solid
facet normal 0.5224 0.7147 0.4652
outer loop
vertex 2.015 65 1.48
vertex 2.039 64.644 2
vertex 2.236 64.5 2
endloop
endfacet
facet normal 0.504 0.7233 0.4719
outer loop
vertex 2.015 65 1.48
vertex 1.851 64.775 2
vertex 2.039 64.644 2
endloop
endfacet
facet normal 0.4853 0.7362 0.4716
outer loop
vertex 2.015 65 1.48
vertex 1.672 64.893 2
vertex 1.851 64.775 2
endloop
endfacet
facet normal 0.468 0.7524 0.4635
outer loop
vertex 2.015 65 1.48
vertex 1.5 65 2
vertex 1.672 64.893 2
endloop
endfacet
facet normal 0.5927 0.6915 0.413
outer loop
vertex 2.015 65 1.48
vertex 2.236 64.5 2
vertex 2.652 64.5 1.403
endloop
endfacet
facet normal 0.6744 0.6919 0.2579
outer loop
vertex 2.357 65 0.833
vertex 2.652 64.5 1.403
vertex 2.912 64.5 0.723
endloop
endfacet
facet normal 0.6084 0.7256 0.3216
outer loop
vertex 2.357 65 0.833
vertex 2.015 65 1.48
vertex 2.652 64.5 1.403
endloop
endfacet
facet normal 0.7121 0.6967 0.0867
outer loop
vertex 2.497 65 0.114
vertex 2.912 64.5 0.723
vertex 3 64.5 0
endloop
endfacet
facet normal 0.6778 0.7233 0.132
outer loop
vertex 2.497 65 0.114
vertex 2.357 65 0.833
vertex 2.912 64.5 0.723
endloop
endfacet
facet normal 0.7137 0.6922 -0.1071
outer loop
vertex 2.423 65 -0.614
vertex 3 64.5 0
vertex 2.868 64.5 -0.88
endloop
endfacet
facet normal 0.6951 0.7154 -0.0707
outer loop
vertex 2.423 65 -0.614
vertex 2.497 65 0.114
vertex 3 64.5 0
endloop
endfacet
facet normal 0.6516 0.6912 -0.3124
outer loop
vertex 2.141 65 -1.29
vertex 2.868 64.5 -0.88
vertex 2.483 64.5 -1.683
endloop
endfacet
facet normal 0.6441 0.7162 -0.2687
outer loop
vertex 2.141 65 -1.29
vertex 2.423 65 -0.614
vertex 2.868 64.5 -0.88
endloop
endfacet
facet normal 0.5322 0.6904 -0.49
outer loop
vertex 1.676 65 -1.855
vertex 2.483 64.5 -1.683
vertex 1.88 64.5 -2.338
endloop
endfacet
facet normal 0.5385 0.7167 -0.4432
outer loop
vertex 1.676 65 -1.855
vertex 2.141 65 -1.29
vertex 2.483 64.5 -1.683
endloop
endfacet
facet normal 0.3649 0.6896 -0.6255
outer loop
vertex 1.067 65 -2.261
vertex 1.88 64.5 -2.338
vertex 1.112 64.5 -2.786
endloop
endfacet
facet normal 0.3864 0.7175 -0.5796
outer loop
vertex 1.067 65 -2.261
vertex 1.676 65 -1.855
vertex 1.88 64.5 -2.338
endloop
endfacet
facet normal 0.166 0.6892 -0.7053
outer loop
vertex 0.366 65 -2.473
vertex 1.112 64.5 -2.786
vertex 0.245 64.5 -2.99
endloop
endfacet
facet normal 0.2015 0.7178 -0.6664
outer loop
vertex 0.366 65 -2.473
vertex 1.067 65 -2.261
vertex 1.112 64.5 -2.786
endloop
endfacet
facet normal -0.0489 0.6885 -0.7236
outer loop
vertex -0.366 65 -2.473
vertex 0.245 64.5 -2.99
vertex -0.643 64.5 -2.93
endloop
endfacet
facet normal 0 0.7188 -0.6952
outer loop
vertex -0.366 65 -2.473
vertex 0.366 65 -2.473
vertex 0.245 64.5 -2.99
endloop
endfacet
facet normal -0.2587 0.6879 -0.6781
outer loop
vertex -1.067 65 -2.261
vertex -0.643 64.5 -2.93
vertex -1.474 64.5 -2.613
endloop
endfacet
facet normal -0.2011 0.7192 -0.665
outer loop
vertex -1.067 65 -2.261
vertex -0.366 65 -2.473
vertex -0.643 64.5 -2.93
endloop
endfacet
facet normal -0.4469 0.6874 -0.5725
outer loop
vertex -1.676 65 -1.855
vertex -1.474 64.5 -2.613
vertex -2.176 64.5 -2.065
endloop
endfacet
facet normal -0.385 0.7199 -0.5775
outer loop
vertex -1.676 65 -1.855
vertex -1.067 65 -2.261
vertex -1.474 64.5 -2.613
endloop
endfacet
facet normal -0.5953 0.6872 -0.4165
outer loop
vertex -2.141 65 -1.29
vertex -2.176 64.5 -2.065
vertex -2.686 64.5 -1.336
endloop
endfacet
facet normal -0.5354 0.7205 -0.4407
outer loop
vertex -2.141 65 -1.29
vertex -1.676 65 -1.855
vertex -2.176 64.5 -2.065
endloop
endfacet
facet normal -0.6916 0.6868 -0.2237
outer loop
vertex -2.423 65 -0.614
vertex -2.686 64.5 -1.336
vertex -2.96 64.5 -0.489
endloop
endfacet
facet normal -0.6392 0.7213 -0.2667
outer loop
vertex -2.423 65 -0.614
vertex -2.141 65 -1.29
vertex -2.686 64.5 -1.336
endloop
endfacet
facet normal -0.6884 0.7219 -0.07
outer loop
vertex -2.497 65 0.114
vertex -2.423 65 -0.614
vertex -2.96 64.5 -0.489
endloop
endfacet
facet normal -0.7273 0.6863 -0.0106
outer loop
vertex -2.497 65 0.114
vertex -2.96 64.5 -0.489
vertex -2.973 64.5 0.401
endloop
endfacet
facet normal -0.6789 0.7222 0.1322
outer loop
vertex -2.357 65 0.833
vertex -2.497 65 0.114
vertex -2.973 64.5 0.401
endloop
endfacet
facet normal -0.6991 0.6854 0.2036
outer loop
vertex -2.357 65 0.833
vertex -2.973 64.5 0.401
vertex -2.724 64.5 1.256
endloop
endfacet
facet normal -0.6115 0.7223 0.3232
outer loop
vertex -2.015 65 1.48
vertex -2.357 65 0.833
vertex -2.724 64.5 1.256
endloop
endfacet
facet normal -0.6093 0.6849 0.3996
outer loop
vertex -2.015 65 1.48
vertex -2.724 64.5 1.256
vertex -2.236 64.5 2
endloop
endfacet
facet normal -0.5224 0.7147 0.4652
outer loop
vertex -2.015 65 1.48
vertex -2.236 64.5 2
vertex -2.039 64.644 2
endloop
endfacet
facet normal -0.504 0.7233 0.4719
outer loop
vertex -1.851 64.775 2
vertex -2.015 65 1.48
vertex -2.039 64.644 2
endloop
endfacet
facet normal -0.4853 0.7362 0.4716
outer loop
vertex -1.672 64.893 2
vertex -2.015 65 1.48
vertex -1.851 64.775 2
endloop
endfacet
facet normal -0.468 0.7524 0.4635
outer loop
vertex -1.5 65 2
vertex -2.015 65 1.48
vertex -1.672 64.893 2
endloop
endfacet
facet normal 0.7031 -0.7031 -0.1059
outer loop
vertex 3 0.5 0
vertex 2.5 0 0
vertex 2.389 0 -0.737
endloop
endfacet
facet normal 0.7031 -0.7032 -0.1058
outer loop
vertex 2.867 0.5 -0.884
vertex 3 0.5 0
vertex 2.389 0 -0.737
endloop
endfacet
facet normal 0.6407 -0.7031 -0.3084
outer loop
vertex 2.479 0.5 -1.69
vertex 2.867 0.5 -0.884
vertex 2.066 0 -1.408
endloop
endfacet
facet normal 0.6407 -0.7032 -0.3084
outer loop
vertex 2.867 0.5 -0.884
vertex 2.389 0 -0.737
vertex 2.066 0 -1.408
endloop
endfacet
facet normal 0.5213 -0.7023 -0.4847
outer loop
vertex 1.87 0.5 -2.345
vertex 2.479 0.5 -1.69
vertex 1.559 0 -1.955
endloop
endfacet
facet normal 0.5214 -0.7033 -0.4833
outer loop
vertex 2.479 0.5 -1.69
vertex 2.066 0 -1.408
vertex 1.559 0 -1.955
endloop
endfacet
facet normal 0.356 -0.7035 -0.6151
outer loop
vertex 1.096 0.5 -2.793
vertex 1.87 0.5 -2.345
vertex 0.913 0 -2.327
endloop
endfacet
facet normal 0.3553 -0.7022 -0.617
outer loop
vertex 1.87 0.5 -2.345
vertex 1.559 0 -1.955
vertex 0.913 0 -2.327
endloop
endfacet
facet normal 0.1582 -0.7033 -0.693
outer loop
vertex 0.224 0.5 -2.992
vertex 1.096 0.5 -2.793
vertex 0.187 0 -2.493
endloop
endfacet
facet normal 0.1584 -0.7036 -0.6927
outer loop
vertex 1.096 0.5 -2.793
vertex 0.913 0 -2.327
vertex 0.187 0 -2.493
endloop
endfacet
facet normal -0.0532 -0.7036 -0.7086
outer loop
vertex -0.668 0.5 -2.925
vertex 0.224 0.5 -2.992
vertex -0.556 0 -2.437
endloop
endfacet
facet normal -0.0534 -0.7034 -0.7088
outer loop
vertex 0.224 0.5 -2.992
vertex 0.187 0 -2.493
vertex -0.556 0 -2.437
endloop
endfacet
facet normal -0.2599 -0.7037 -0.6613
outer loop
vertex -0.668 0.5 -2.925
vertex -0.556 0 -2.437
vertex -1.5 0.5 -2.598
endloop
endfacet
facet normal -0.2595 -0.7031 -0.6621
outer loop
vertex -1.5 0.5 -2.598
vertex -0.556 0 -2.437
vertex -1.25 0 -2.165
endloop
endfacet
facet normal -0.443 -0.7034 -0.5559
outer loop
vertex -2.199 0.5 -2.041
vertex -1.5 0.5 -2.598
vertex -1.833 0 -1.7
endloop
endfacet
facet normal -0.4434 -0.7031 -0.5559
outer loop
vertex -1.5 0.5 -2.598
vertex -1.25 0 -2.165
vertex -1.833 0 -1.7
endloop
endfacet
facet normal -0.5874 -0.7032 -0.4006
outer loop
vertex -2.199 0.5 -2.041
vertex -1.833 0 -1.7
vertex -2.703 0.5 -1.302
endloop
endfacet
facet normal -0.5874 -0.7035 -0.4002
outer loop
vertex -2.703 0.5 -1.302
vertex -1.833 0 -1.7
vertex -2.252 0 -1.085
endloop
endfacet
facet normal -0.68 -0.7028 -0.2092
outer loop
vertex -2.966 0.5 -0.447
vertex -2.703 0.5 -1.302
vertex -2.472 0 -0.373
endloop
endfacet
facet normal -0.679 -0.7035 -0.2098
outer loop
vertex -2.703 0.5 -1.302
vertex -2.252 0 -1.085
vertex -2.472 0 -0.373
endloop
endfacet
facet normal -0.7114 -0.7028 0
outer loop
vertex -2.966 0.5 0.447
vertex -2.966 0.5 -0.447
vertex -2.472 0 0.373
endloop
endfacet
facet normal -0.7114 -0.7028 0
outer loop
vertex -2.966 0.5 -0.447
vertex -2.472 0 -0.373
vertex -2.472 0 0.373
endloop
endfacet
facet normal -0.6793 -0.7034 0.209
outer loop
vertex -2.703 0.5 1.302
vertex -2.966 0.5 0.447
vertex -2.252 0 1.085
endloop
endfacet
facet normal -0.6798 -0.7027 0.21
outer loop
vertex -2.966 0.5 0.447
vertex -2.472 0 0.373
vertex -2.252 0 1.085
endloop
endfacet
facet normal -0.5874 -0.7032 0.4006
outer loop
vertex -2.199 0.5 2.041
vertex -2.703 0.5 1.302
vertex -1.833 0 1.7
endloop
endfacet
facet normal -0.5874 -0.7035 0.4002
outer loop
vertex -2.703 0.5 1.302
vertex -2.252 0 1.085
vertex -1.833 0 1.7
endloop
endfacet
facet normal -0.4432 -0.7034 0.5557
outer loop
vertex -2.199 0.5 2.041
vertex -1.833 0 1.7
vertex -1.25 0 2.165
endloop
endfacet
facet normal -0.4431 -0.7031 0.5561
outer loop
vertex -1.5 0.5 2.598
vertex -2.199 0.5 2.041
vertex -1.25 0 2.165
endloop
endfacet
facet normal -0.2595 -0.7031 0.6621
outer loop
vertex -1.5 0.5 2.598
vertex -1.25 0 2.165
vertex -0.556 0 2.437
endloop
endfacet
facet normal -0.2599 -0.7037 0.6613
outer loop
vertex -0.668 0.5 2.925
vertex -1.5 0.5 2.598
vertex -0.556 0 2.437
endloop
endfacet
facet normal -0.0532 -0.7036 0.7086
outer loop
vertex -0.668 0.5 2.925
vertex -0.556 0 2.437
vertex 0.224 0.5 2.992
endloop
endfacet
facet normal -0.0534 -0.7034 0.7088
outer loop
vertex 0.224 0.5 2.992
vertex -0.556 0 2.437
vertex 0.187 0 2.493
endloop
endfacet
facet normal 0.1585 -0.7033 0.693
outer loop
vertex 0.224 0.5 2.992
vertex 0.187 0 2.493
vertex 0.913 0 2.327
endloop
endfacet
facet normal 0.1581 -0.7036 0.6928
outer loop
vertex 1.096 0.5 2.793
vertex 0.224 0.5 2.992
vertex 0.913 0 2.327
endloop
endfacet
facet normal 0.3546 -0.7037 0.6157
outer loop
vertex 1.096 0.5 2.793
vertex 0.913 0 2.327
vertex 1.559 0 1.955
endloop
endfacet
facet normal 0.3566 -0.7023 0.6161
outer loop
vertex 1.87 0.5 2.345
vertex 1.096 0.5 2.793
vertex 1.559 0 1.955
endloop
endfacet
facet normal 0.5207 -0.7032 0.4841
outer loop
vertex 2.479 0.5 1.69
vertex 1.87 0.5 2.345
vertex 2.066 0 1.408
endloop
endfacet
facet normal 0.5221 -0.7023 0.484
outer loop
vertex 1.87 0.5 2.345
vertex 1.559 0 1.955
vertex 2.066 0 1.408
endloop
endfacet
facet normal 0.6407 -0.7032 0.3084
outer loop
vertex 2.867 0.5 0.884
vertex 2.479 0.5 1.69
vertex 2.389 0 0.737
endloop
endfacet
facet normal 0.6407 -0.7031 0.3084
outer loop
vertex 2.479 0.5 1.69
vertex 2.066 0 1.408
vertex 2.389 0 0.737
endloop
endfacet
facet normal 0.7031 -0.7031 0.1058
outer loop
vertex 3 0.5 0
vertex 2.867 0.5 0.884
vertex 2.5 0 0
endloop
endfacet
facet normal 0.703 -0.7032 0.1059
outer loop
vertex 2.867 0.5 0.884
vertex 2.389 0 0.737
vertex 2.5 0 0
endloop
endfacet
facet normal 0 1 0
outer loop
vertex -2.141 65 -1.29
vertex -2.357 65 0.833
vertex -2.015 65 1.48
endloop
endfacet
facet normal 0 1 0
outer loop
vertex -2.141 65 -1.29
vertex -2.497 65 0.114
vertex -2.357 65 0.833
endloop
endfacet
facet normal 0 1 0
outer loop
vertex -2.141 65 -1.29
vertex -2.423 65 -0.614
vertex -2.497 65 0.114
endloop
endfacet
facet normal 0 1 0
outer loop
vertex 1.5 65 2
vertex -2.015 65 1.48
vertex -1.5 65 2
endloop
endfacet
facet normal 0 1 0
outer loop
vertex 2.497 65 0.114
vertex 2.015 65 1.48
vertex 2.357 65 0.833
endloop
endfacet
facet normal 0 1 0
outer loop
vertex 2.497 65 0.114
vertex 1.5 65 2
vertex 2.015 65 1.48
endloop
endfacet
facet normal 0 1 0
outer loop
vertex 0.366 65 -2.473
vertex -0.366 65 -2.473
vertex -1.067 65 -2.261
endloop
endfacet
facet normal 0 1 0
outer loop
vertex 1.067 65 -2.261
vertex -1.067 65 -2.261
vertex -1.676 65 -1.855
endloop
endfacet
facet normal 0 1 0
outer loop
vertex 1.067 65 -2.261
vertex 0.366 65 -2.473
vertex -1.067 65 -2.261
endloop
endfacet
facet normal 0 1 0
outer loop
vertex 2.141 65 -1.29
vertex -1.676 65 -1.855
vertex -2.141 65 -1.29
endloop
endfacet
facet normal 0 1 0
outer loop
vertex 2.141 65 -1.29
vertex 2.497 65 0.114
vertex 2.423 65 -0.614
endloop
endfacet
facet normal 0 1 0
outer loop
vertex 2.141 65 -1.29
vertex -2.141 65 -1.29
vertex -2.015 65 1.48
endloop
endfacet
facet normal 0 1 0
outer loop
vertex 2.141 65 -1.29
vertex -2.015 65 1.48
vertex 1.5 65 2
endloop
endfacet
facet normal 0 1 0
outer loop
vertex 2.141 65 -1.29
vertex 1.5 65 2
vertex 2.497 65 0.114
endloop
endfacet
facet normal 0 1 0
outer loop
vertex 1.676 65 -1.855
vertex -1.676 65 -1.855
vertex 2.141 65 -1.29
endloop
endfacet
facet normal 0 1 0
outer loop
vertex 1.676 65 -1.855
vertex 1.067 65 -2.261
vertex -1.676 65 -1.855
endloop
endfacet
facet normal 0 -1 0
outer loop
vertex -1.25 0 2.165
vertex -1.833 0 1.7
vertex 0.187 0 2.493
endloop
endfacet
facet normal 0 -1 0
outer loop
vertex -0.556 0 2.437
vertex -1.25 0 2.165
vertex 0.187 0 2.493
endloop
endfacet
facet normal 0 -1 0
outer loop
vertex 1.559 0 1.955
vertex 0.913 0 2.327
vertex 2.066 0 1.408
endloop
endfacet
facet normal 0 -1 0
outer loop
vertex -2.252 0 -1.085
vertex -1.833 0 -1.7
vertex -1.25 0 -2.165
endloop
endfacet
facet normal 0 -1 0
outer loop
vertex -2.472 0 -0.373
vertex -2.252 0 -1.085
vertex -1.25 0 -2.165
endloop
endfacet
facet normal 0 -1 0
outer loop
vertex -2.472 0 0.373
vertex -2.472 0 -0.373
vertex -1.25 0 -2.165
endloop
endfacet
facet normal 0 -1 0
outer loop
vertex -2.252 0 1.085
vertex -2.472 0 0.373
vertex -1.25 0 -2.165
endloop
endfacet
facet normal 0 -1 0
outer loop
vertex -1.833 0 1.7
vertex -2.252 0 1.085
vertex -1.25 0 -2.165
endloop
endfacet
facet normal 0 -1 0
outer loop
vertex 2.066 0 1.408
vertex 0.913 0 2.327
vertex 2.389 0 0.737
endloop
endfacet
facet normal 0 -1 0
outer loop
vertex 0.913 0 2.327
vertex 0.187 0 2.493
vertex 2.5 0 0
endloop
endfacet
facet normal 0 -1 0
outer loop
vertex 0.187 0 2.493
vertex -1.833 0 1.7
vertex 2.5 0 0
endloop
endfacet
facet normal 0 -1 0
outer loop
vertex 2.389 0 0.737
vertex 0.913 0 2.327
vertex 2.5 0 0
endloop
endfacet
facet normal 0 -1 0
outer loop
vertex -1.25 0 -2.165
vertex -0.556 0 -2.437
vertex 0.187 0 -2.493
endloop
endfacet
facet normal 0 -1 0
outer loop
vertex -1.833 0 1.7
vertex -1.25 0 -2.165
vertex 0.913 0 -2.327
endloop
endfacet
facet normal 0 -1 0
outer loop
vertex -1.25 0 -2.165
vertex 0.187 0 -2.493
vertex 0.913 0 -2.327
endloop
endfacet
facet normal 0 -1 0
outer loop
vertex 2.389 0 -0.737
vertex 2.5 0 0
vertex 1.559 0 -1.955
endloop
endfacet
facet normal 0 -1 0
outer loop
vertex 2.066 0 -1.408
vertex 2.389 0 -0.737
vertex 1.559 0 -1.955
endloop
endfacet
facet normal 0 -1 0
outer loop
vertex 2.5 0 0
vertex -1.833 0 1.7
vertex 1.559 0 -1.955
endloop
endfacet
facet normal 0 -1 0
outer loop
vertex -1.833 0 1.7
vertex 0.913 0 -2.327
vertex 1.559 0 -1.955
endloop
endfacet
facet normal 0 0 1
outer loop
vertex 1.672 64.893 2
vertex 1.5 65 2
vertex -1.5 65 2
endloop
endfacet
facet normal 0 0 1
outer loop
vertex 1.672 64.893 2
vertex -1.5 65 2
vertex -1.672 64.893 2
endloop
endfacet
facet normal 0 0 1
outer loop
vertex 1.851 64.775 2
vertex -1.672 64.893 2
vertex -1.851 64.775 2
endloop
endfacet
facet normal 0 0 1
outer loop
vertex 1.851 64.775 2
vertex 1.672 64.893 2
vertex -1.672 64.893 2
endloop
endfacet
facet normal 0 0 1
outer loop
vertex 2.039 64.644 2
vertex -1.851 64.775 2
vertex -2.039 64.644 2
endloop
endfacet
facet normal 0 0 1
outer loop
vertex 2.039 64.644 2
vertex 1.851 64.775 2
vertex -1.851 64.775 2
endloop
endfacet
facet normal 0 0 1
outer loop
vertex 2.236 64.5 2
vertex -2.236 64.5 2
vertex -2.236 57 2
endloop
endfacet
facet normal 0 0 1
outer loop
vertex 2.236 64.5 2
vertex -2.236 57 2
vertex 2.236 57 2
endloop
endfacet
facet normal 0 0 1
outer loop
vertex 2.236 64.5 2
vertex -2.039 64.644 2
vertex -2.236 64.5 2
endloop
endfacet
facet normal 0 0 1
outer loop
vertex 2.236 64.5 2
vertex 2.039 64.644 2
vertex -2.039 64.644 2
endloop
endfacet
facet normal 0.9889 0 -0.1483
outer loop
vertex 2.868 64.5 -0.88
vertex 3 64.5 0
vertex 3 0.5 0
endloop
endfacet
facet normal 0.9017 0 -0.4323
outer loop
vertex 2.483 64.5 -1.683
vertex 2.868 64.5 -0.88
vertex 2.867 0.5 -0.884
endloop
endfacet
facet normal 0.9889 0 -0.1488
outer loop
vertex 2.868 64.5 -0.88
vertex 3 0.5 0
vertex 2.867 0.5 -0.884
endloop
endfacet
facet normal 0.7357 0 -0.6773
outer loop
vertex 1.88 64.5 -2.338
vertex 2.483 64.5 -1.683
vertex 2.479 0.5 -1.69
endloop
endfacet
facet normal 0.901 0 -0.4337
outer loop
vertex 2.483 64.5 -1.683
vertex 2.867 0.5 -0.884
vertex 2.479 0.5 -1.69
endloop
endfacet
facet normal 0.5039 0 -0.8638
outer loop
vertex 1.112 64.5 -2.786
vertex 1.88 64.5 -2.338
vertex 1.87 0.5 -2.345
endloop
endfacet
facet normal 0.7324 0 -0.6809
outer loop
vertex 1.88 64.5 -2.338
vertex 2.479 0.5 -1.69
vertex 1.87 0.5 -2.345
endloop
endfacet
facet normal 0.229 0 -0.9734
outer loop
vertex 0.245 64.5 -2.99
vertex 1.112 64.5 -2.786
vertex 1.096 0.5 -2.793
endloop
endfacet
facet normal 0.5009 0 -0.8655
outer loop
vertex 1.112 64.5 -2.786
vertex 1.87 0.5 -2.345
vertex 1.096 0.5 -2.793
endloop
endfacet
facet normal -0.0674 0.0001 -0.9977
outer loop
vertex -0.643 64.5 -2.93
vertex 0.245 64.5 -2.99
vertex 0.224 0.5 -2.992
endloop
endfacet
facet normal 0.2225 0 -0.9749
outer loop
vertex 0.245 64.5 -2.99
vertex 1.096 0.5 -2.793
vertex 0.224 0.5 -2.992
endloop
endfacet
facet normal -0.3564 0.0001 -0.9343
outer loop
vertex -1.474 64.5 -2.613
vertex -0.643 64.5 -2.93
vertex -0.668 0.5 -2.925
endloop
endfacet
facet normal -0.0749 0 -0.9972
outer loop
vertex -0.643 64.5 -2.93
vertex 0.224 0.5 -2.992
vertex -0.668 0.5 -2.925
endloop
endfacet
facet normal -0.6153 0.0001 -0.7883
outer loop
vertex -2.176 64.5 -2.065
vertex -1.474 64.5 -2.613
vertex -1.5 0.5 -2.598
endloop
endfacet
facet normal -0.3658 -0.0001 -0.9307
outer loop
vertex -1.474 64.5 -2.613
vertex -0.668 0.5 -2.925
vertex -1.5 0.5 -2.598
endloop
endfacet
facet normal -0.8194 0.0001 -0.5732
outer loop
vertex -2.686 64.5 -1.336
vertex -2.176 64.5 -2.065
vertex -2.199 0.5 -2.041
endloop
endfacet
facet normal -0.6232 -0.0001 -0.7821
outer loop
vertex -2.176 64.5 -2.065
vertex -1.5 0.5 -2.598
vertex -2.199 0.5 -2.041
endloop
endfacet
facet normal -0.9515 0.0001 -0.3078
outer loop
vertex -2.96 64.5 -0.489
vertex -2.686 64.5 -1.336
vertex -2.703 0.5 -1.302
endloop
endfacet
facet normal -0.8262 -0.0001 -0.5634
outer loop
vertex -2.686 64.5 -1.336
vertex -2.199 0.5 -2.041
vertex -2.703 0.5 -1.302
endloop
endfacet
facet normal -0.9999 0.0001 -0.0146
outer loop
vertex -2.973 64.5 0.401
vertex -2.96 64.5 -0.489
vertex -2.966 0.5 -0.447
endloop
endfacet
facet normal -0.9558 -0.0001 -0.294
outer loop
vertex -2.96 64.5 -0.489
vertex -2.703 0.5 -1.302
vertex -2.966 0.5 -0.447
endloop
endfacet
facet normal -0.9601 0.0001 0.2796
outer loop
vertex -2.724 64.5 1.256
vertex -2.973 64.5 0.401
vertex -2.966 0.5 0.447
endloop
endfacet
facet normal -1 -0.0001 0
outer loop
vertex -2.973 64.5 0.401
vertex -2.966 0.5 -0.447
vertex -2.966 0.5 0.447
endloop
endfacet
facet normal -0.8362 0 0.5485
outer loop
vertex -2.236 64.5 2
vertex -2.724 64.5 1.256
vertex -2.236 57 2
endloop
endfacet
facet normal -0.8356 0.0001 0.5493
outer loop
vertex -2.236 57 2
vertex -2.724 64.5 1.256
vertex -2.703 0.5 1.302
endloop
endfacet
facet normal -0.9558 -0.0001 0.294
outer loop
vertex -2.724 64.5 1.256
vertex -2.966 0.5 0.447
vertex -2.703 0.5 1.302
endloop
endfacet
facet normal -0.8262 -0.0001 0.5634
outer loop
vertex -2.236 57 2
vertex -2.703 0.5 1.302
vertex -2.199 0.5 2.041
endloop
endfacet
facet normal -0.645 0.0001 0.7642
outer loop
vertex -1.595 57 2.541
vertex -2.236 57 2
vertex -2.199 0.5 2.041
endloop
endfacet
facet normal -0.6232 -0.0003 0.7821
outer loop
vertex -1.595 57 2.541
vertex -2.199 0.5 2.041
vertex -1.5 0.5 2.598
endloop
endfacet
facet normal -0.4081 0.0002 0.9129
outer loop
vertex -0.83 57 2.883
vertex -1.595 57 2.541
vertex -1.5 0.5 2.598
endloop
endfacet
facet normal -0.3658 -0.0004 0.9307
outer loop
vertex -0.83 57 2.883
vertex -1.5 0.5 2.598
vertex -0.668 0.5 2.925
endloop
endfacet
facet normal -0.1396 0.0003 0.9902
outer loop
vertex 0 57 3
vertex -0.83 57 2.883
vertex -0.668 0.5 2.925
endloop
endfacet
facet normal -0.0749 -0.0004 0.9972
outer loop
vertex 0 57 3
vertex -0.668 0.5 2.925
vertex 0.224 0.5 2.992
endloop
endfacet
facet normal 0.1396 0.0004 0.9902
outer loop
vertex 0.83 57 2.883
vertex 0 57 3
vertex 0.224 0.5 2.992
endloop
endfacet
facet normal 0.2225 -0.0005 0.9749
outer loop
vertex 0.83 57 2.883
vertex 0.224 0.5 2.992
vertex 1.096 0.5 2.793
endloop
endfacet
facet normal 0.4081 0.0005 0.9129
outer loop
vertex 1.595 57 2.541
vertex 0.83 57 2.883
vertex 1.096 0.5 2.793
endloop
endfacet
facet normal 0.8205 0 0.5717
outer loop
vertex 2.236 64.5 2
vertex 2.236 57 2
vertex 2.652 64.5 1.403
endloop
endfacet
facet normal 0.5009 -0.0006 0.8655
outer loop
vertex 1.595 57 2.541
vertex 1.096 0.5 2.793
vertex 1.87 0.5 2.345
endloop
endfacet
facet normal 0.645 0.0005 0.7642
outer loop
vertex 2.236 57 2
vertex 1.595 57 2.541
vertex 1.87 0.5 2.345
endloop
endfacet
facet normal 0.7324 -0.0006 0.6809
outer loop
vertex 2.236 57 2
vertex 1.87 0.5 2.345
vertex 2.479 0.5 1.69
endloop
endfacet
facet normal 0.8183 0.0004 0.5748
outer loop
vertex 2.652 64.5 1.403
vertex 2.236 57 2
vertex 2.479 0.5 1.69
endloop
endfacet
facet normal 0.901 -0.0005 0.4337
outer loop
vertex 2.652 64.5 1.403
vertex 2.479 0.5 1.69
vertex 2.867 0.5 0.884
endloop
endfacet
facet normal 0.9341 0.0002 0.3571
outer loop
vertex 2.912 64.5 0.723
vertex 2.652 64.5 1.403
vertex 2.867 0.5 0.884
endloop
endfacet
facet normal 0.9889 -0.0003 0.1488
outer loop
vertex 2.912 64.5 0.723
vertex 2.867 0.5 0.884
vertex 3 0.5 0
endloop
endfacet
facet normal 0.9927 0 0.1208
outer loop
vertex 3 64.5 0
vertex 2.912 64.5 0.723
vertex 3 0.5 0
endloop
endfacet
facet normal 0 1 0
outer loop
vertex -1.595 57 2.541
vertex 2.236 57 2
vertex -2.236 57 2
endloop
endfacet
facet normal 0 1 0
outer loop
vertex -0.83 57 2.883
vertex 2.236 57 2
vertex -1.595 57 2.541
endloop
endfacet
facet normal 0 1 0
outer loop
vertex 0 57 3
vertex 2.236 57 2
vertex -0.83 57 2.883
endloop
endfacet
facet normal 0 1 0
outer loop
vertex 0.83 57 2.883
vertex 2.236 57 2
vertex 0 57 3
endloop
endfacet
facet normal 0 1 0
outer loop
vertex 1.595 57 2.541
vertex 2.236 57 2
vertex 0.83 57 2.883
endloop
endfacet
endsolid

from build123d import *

# Parameters (mm, degrees)
SKETCH1_R           = 3
BOSS_EXTRUDE1_DEPTH = 65
CUT_EXTRUDE1_DEPTH  = 8
CHAMFER1_SIZE       = 0.5


with BuildPart() as part:
    # Sketch1 → Boss-Extrude1 (new body)
    with BuildSketch(Plane(origin=(0, 0, 0), x_dir=(1, 0, 0), z_dir=(0, 1, 0))):
        Circle(SKETCH1_R)
    extrude(amount=BOSS_EXTRUDE1_DEPTH)

    # Sketch2 → Cut-Extrude1 (cut)
    with BuildSketch(Plane(origin=(0, 65, 0), x_dir=(1, 0, 0), z_dir=(0, 1, 0))):
        with BuildLine():
            Line((-2.236067977, -2), (2.236067977, -2))
            ThreePointArc((2.236067977, -2), (0, -3), (-2.236067977, -2))
        make_face()
    extrude(amount=-CUT_EXTRUDE1_DEPTH, mode=Mode.SUBTRACT)

    # Chamfer1
    chamfer1_edges = [part.edges().sort_by_distance(p)[0] for p in [
        (-3, 0, 0),
        (-1.070466269, 65, -2.802517077),
    ]]
    chamfer(chamfer1_edges, length=CHAMFER1_SIZE)


solid = part.part
